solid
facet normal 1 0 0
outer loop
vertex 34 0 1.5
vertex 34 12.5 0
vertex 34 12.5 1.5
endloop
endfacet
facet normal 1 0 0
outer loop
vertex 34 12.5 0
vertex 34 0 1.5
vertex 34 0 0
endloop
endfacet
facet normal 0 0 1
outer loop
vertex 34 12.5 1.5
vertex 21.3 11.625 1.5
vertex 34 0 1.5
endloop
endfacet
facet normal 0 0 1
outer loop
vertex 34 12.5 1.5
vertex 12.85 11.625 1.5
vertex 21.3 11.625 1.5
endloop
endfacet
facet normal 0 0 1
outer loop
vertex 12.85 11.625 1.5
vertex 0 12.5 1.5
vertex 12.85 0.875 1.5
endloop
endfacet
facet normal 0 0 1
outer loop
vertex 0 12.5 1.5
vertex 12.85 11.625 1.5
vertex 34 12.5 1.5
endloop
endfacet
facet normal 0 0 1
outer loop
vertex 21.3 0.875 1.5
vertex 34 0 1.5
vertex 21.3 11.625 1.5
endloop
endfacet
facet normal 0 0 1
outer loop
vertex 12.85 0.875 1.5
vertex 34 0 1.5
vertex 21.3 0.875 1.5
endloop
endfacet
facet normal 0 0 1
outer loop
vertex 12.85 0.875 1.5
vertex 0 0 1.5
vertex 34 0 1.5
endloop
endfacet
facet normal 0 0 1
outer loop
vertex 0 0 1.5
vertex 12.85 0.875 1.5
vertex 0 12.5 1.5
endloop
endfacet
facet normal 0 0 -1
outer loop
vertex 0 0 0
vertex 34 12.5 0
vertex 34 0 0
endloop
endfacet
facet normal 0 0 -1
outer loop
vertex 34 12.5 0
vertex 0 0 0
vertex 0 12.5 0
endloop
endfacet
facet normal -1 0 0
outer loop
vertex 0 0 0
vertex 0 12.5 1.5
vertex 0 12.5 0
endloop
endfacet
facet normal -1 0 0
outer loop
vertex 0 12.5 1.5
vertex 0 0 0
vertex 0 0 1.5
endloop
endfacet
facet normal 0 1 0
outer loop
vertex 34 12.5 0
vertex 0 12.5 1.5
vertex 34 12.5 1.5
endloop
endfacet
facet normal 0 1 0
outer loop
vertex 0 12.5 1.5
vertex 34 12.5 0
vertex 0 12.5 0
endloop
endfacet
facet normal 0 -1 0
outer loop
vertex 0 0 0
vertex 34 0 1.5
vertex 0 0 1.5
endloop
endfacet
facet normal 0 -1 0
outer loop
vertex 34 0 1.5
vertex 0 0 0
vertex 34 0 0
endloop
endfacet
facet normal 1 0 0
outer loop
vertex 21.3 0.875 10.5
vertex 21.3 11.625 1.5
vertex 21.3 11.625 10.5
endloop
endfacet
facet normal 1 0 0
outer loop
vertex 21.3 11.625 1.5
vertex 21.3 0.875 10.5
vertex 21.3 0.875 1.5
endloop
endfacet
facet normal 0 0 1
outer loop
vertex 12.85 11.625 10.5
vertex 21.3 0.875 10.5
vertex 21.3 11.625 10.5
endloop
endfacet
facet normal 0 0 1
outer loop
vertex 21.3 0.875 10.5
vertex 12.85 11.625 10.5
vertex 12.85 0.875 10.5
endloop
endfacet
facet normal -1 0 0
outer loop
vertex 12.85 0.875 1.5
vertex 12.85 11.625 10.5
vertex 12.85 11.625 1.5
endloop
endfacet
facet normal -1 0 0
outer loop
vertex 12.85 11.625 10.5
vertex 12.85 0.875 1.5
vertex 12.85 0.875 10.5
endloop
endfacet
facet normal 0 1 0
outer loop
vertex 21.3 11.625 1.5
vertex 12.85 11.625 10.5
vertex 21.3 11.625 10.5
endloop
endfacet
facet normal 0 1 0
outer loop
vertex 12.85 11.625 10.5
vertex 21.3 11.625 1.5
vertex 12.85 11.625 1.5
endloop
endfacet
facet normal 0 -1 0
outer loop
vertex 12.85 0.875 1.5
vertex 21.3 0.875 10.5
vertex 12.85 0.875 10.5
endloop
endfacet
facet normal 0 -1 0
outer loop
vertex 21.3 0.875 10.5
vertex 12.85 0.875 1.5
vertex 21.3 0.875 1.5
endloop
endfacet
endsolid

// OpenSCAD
$fn=100;

base_width_x = 34;
base_length_y = 12.5;
base_z = 1.5;

hole_x = 8.45; //specsheet says 8.9 USE 8.87
hole_y = 10.75; //specsheet says 10.9 USE 10.87
hole_z = 9;

wall_thickness = 2.2;//specsheet says 2.27 USE 2.29

module tapita()
{
    union()
    {   
        cube([base_width_x, base_length_y, base_z]);
        /**translate([wall_thickness , base_length_y/2 - hole_y/2 , base_z])
        {
            color([0.5,0.3,0.5]) cube([hole_x, hole_y, hole_z]);
        }
        **/
         translate([2*wall_thickness + hole_x,  base_length_y/2 - hole_y/2 , base_z])
        {
            color([0.5,0.3,0.3]) cube([hole_x, hole_y, hole_z]);
        }
        
    }
}

tapita();
